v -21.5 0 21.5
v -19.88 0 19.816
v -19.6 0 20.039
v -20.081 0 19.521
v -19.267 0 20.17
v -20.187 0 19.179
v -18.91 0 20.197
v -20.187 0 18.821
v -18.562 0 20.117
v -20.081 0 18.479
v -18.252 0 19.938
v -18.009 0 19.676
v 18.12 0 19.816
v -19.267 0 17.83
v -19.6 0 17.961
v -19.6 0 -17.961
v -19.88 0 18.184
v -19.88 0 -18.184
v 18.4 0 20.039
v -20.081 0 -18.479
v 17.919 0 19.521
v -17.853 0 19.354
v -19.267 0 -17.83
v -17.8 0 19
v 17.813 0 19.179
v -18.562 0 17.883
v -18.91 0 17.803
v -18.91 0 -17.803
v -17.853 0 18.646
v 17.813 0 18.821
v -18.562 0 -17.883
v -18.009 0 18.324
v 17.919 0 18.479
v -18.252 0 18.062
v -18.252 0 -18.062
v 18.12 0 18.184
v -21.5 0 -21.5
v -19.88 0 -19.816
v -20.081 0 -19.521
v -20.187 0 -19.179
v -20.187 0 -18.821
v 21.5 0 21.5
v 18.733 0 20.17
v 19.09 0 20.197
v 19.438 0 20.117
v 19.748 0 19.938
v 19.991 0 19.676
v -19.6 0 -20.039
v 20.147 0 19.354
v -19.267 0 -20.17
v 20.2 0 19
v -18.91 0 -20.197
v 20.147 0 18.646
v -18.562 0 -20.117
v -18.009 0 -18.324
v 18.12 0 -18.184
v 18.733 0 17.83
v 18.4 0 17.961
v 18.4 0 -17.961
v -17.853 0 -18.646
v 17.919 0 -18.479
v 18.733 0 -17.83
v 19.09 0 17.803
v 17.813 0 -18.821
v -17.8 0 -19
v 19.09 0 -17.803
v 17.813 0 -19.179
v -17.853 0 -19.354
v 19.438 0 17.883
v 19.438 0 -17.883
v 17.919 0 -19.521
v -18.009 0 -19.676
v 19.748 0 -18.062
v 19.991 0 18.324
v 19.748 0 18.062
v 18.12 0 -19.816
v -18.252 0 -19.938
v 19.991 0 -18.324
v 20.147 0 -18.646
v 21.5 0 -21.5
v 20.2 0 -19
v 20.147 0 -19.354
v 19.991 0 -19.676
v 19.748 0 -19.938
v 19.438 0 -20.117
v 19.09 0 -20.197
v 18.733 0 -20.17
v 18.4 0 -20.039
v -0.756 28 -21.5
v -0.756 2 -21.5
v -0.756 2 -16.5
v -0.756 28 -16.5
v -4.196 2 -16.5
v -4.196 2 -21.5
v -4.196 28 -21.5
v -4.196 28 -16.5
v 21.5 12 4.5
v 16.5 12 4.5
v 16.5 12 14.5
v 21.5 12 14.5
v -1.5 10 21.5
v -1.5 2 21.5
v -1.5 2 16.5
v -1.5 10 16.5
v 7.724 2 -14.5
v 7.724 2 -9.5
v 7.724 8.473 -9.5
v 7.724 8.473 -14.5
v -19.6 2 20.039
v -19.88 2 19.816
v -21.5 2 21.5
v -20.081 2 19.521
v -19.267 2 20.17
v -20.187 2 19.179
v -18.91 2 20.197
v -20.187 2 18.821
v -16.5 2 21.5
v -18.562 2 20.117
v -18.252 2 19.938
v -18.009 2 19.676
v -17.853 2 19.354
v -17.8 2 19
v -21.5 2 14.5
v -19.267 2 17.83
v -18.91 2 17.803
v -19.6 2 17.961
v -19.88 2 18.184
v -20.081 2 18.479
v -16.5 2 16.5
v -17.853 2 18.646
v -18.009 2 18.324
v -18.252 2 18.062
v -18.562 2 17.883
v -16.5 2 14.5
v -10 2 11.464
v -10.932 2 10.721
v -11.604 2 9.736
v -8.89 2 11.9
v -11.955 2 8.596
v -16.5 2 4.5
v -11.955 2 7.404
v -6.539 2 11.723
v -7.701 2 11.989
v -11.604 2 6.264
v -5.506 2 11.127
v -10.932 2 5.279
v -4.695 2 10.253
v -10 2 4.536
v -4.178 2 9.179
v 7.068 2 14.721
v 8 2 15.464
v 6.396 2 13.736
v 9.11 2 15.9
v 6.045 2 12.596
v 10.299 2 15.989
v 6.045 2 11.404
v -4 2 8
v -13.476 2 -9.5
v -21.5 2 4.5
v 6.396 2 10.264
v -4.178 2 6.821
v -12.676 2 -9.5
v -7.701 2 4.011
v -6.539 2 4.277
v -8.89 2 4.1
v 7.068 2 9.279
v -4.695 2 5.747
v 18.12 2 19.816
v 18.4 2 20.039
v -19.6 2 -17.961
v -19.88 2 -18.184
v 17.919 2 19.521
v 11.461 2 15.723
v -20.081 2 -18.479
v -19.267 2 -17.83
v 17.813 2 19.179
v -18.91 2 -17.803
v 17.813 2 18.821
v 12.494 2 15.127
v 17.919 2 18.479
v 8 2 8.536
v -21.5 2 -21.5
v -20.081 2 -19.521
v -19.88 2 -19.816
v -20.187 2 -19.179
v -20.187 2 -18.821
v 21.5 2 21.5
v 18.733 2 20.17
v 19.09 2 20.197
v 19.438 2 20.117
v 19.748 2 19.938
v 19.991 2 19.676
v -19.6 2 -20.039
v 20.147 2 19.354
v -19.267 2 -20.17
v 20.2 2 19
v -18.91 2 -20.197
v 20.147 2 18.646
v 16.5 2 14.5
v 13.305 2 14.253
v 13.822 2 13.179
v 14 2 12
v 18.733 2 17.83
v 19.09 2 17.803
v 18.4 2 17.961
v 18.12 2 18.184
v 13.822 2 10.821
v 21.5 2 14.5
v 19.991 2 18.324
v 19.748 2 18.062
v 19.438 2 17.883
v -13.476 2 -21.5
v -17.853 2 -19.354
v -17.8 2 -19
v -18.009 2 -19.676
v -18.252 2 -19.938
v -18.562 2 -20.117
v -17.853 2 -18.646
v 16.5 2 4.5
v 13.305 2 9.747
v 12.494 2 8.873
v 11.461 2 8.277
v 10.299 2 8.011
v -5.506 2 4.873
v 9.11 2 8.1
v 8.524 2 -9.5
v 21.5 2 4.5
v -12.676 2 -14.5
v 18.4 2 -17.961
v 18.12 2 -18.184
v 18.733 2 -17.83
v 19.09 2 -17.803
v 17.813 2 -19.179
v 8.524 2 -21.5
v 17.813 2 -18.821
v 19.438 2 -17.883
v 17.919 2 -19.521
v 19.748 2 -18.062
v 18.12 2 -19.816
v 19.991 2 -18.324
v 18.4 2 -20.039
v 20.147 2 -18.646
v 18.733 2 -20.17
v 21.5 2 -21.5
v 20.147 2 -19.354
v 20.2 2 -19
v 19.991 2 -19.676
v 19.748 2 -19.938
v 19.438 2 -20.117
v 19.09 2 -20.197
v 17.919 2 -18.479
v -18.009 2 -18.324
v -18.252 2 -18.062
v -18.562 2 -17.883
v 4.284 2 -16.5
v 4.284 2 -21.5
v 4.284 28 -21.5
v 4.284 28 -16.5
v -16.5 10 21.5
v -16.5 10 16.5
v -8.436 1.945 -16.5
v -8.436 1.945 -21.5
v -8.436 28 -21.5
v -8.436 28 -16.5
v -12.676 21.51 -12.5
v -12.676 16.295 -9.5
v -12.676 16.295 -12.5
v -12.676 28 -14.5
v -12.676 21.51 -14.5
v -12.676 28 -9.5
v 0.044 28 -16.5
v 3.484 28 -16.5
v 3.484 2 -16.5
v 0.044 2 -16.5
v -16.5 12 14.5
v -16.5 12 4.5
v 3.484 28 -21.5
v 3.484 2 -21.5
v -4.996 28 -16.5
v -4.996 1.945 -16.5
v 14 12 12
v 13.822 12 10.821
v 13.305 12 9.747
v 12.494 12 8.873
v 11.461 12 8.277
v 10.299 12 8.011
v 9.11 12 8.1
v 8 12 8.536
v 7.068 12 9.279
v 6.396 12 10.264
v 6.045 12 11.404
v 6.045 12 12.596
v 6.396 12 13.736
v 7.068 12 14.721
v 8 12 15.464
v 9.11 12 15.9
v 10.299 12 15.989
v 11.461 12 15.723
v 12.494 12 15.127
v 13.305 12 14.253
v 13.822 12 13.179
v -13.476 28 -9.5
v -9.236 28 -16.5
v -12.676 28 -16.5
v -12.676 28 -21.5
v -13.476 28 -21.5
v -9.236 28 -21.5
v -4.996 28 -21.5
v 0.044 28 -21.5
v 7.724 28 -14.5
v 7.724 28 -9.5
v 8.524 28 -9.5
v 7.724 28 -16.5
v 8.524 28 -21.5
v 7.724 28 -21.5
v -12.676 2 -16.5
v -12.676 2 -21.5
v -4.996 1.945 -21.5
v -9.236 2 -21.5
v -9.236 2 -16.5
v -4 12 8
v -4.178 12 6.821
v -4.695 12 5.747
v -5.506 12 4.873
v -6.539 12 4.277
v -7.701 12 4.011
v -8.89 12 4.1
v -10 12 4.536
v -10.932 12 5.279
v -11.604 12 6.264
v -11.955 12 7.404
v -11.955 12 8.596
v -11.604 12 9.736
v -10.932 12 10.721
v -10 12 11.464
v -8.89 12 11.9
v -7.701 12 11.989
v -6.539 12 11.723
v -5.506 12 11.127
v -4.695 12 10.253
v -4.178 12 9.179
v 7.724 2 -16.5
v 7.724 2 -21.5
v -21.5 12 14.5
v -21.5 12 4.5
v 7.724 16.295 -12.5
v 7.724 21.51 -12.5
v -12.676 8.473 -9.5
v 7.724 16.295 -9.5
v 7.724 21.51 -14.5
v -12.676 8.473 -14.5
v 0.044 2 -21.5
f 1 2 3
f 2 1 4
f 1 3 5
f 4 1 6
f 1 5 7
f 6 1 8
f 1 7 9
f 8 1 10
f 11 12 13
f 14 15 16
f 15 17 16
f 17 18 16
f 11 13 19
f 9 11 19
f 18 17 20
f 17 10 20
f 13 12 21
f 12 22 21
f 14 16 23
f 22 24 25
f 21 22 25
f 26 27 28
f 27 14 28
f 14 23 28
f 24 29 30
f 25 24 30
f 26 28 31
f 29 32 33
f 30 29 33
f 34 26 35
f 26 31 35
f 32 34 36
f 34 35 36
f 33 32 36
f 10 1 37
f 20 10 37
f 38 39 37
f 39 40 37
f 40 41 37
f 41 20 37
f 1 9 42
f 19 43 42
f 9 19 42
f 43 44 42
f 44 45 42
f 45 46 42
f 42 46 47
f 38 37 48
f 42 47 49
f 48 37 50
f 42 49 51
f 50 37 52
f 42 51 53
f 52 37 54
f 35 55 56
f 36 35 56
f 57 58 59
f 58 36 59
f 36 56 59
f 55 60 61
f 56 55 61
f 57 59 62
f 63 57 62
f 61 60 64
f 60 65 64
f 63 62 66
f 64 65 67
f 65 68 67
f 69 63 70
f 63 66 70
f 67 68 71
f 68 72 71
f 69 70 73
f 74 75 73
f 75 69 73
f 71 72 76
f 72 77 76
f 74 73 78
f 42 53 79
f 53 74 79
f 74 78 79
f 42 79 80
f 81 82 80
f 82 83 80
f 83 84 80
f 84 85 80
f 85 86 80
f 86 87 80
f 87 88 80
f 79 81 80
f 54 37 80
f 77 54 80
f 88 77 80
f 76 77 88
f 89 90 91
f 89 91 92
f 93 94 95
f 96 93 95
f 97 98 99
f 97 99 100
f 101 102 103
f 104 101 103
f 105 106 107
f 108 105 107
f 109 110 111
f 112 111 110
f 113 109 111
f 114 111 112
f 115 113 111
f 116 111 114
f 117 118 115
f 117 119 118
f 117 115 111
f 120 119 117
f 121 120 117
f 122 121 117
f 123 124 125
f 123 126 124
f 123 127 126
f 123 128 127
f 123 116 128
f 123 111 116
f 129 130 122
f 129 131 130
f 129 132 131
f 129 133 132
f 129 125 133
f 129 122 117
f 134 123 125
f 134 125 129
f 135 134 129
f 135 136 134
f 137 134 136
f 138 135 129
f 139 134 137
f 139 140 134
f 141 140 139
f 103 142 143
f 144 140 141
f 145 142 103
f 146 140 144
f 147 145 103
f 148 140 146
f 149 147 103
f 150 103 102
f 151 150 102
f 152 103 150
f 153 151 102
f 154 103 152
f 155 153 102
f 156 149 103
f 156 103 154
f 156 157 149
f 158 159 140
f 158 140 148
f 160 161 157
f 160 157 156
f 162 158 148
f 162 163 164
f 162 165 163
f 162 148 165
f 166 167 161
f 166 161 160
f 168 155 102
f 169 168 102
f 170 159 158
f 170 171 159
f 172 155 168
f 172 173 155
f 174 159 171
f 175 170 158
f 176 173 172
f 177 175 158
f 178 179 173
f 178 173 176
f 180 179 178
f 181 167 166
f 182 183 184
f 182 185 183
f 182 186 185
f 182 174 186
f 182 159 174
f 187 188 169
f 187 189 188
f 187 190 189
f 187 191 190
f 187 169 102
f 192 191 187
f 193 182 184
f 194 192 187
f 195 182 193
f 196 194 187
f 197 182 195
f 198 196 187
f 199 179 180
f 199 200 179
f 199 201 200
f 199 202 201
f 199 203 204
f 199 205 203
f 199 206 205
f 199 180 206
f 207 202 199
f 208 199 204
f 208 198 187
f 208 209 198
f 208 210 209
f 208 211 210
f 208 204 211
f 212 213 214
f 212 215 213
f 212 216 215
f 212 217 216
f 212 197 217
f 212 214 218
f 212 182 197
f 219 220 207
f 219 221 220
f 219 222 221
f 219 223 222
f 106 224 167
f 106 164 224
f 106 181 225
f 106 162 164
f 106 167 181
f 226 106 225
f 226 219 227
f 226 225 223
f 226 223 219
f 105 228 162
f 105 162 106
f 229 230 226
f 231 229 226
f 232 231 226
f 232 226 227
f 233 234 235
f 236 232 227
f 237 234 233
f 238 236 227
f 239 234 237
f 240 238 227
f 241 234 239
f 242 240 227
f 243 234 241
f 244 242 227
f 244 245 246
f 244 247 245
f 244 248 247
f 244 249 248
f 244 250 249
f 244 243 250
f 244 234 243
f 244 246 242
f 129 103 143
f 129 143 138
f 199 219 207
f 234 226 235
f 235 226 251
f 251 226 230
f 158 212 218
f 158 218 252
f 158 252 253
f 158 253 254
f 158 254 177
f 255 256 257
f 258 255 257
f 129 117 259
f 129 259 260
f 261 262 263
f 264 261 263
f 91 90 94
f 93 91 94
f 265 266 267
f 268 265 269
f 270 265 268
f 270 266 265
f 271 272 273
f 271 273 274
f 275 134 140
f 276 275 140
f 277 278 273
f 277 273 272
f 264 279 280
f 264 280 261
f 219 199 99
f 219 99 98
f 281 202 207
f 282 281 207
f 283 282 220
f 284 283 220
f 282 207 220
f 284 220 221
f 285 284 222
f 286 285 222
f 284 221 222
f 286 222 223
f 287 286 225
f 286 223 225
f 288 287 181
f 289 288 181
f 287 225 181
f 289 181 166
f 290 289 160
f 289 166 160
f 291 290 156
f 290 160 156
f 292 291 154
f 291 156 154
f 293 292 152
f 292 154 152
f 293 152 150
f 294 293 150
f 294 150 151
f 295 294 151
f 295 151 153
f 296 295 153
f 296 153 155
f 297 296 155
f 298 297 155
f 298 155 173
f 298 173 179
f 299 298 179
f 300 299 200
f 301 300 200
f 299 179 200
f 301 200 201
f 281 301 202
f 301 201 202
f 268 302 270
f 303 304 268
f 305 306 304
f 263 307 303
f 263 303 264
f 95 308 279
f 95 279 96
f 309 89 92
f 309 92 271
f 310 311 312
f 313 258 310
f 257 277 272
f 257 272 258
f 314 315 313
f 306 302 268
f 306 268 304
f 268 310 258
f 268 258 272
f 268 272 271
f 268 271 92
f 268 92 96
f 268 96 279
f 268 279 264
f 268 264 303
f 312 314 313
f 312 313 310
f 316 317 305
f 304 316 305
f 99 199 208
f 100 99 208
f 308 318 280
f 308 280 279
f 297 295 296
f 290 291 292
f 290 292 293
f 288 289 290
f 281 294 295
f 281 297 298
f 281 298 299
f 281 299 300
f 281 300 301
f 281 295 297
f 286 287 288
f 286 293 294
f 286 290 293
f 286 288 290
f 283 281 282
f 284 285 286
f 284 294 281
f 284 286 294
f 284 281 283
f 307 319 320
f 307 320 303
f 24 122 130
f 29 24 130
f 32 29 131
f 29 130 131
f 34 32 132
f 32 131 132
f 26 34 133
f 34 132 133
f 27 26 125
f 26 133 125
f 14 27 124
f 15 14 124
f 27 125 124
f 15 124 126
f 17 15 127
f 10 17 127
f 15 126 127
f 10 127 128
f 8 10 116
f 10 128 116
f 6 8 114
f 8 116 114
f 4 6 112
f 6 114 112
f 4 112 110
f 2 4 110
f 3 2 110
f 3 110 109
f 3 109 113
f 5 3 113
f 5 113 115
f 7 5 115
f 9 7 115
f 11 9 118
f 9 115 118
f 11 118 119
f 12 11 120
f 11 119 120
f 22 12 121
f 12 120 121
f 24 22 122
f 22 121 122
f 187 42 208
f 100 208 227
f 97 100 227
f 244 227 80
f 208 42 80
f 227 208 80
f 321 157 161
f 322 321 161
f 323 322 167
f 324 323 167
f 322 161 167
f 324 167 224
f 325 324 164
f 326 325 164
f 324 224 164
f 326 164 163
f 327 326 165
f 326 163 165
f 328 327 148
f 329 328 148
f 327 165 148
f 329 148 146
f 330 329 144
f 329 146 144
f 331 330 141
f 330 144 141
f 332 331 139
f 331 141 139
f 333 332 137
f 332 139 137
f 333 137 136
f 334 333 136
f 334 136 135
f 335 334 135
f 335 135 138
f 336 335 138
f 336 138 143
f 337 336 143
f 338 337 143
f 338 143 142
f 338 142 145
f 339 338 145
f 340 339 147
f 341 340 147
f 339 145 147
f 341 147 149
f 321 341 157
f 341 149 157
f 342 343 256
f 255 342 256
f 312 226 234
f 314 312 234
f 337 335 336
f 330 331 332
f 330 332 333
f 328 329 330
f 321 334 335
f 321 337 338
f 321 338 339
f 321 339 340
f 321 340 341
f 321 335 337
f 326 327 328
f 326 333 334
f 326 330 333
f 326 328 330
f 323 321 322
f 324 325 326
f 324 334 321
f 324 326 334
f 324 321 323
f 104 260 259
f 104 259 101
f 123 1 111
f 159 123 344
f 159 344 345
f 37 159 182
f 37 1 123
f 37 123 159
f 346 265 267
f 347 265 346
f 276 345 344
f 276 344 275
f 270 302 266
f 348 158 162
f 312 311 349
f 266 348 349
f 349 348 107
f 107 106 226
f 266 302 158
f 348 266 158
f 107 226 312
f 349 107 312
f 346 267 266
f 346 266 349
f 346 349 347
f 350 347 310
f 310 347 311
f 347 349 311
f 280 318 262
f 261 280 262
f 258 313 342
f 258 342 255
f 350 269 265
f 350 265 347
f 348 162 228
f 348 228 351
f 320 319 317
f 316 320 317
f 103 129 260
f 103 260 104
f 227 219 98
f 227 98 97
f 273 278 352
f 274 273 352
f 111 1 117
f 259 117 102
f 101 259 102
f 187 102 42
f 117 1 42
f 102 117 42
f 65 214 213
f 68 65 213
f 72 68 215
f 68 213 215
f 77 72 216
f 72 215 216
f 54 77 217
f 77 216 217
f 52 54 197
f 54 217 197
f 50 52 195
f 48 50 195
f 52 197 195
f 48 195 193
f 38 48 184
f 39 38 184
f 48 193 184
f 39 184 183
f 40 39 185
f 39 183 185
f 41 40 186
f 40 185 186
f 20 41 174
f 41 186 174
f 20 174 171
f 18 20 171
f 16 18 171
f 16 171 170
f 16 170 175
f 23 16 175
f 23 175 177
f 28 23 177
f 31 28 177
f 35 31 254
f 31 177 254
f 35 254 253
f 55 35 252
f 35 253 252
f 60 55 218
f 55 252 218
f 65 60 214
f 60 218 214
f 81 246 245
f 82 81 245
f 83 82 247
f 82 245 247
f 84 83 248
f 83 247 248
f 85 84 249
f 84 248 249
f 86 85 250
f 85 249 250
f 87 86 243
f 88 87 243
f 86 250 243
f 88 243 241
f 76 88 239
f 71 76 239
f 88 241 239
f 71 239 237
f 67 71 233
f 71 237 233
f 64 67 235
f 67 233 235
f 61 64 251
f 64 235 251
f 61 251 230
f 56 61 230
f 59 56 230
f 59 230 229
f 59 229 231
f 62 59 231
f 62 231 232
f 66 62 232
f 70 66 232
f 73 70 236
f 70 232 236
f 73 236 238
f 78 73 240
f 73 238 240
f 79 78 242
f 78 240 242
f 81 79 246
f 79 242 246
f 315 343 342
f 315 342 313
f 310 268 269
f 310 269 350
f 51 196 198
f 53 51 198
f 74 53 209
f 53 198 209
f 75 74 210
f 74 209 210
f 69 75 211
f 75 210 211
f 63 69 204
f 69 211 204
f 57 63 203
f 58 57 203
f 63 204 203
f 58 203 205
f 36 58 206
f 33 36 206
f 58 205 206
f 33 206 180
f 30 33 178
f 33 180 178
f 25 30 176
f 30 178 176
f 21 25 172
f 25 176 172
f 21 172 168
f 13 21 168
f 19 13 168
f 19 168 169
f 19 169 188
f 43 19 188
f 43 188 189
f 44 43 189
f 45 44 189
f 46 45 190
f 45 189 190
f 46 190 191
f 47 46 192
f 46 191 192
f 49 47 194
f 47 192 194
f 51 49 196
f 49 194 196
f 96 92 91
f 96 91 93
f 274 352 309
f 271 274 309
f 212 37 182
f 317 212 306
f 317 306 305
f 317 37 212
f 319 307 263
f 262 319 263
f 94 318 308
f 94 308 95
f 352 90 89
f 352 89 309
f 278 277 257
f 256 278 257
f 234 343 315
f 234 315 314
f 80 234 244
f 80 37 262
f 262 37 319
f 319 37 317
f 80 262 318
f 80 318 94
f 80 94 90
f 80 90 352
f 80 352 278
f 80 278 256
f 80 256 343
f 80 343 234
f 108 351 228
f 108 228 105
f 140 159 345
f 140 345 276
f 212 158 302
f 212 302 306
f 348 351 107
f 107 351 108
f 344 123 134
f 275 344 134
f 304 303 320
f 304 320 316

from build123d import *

# Parameters (mm, degrees)
SKETCH_1_W          = 43
SKETCH_1_H          = 43
EXTRUDE_1_DEPTH     = 2
SKETCH_2_W          = 15
SKETCH_2_H          = 5
EXTRUDE_2_DEPTH     = 10
SKETCH_3_W          = 5
SKETCH_3_H          = 10
EXTRUDE_3_DEPTH     = 10
SKETCH_4_W          = 5
SKETCH_4_H          = 10
EXTRUDE_4_DEPTH     = 10
SKETCH_5_R          = 4
EXTRUDE_5_DEPTH     = 10
SKETCH_6_R          = 4
EXTRUDE_6_DEPTH     = 10
SKETCH_7_W          = 22
SKETCH_7_H          = 12
EXTRUDE_7_DEPTH     = 26
SKETCH_8_W          = 3.44
SKETCH_8_H          = 26
SKETCH_8_H_2        = 26.05521278
CUT_EXTRUDE_1_DEPTH = 5
SKETCH_11_W         = 20.4
SKETCH_11_H         = 26
CUT_EXTRUDE_2_DEPTH = 5
SKETCH_12_W         = 20.4
SKETCH_12_H         = 7.82225214
EXTRUDE_8_DEPTH     = 5
SKETCH_13_W         = 20.4
SKETCH_13_H         = 5.214716639
EXTRUDE_9_DEPTH     = 2
SKETCH_14_R         = 1.2
CUT_EXTRUDE_3_DEPTH = 2


with BuildPart() as part:
    # 草图1 → 凸台-拉伸1 (new body)
    with BuildSketch(Plane(origin=(0, 0, 0), x_dir=(1, 0, 0), z_dir=(0, 1, 0))):
        Rectangle(SKETCH_1_W, SKETCH_1_H)
    extrude(amount=EXTRUDE_1_DEPTH)

    # 草图2 → 凸台-拉伸2 (add)
    with BuildSketch(Plane(origin=(0, 0, 0), x_dir=(1, 0, 0), z_dir=(0, 1, 0))):
        with Locations((-9, -19)):
            Rectangle(SKETCH_2_W, SKETCH_2_H)
    extrude(amount=EXTRUDE_2_DEPTH)

    # 草图3 → 凸台-拉伸3 (add)
    with BuildSketch(Plane(origin=(0, 2, 0), x_dir=(1, 0, 0), z_dir=(0, 1, 0))):
        with Locations((-19, -9.5)):
            Rectangle(SKETCH_3_W, SKETCH_3_H)
    extrude(amount=EXTRUDE_3_DEPTH)

    # 草图4 → 凸台-拉伸4 (add)
    with BuildSketch(Plane(origin=(0, 2, 0), x_dir=(1, 0, 0), z_dir=(0, 1, 0))):
        with Locations((19, -9.5)):
            Rectangle(SKETCH_4_W, SKETCH_4_H)
    extrude(amount=EXTRUDE_4_DEPTH)

    # 草图5 → 凸台-拉伸5 (add)
    with BuildSketch(Plane(origin=(0, 2, 0), x_dir=(1, 0, 0), z_dir=(0, 1, 0))):
        with Locations((-8, -8)):
            Circle(SKETCH_5_R)
    extrude(amount=EXTRUDE_5_DEPTH)

    # 草图6 → 凸台-拉伸6 (add)
    with BuildSketch(Plane(origin=(0, 2, 0), x_dir=(1, 0, 0), z_dir=(0, 1, 0))):
        with Locations((10, -12)):
            Circle(SKETCH_6_R)
    extrude(amount=EXTRUDE_6_DEPTH)

    # 草图7 → 凸台-拉伸7 (add)
    with BuildSketch(Plane(origin=(0, 2, 0), x_dir=(1, 0, 0), z_dir=(0, 1, 0))):
        with Locations((-2.475742283, 15.5)):
            Rectangle(SKETCH_7_W, SKETCH_7_H)
    extrude(amount=EXTRUDE_7_DEPTH)

    # 草图8 → 切除-拉伸1 (cut)
    with BuildSketch(Plane(origin=(0, 0, -21.5), x_dir=(-1, 0, 0), z_dir=(0, 0, -1))):
        with Locations((10.955742283, 15)):
            Rectangle(SKETCH_8_W, SKETCH_8_H)
        with Locations((6.715742283, 14.97239361)):
            Rectangle(SKETCH_8_W, SKETCH_8_H_2)
        with Locations((2.475742283, 15)):
            Rectangle(SKETCH_8_W, SKETCH_8_H)
        with Locations((-1.764257717, 15)):
            Rectangle(SKETCH_8_W, SKETCH_8_H)
        with Locations((-6.004257717, 15)):
            Rectangle(SKETCH_8_W, SKETCH_8_H)
    extrude(amount=-CUT_EXTRUDE_1_DEPTH, mode=Mode.SUBTRACT)

    # 草图11 → 切除-拉伸2 (cut)
    with BuildSketch(Plane.XY.offset(-9.5)):
        with Locations((-2.475742283, 15)):
            Rectangle(SKETCH_11_W, SKETCH_11_H)
    extrude(amount=-CUT_EXTRUDE_2_DEPTH, mode=Mode.SUBTRACT)

    # 草图12 → 凸台-拉伸8 (add)
    with BuildSketch(Plane.XY.offset(-14.5)):
        with Locations((-2.475742283, 12.38380745)):
            Rectangle(SKETCH_12_W, SKETCH_12_H)
    extrude(amount=EXTRUDE_8_DEPTH)

    # 草图13 → 凸台-拉伸9 (add)
    with BuildSketch(Plane.XY.offset(-14.5)):
        with Locations((-2.475742283, 18.90229184)):
            Rectangle(SKETCH_13_W, SKETCH_13_H)
    extrude(amount=EXTRUDE_9_DEPTH)

    # 草图14 → 切除-拉伸3 (cut)
    with BuildSketch(Plane(origin=(0, 2, 0), x_dir=(1, 0, 0), z_dir=(0, 1, 0))):
        with Locations((-19, 19)):
            Circle(SKETCH_14_R)
        with Locations((19, 19)):
            Circle(SKETCH_14_R)
        with Locations((-19, -19)):
            Circle(SKETCH_14_R)
        with Locations((19, -19)):
            Circle(SKETCH_14_R)
    extrude(amount=-CUT_EXTRUDE_3_DEPTH, mode=Mode.SUBTRACT)


solid = part.part
